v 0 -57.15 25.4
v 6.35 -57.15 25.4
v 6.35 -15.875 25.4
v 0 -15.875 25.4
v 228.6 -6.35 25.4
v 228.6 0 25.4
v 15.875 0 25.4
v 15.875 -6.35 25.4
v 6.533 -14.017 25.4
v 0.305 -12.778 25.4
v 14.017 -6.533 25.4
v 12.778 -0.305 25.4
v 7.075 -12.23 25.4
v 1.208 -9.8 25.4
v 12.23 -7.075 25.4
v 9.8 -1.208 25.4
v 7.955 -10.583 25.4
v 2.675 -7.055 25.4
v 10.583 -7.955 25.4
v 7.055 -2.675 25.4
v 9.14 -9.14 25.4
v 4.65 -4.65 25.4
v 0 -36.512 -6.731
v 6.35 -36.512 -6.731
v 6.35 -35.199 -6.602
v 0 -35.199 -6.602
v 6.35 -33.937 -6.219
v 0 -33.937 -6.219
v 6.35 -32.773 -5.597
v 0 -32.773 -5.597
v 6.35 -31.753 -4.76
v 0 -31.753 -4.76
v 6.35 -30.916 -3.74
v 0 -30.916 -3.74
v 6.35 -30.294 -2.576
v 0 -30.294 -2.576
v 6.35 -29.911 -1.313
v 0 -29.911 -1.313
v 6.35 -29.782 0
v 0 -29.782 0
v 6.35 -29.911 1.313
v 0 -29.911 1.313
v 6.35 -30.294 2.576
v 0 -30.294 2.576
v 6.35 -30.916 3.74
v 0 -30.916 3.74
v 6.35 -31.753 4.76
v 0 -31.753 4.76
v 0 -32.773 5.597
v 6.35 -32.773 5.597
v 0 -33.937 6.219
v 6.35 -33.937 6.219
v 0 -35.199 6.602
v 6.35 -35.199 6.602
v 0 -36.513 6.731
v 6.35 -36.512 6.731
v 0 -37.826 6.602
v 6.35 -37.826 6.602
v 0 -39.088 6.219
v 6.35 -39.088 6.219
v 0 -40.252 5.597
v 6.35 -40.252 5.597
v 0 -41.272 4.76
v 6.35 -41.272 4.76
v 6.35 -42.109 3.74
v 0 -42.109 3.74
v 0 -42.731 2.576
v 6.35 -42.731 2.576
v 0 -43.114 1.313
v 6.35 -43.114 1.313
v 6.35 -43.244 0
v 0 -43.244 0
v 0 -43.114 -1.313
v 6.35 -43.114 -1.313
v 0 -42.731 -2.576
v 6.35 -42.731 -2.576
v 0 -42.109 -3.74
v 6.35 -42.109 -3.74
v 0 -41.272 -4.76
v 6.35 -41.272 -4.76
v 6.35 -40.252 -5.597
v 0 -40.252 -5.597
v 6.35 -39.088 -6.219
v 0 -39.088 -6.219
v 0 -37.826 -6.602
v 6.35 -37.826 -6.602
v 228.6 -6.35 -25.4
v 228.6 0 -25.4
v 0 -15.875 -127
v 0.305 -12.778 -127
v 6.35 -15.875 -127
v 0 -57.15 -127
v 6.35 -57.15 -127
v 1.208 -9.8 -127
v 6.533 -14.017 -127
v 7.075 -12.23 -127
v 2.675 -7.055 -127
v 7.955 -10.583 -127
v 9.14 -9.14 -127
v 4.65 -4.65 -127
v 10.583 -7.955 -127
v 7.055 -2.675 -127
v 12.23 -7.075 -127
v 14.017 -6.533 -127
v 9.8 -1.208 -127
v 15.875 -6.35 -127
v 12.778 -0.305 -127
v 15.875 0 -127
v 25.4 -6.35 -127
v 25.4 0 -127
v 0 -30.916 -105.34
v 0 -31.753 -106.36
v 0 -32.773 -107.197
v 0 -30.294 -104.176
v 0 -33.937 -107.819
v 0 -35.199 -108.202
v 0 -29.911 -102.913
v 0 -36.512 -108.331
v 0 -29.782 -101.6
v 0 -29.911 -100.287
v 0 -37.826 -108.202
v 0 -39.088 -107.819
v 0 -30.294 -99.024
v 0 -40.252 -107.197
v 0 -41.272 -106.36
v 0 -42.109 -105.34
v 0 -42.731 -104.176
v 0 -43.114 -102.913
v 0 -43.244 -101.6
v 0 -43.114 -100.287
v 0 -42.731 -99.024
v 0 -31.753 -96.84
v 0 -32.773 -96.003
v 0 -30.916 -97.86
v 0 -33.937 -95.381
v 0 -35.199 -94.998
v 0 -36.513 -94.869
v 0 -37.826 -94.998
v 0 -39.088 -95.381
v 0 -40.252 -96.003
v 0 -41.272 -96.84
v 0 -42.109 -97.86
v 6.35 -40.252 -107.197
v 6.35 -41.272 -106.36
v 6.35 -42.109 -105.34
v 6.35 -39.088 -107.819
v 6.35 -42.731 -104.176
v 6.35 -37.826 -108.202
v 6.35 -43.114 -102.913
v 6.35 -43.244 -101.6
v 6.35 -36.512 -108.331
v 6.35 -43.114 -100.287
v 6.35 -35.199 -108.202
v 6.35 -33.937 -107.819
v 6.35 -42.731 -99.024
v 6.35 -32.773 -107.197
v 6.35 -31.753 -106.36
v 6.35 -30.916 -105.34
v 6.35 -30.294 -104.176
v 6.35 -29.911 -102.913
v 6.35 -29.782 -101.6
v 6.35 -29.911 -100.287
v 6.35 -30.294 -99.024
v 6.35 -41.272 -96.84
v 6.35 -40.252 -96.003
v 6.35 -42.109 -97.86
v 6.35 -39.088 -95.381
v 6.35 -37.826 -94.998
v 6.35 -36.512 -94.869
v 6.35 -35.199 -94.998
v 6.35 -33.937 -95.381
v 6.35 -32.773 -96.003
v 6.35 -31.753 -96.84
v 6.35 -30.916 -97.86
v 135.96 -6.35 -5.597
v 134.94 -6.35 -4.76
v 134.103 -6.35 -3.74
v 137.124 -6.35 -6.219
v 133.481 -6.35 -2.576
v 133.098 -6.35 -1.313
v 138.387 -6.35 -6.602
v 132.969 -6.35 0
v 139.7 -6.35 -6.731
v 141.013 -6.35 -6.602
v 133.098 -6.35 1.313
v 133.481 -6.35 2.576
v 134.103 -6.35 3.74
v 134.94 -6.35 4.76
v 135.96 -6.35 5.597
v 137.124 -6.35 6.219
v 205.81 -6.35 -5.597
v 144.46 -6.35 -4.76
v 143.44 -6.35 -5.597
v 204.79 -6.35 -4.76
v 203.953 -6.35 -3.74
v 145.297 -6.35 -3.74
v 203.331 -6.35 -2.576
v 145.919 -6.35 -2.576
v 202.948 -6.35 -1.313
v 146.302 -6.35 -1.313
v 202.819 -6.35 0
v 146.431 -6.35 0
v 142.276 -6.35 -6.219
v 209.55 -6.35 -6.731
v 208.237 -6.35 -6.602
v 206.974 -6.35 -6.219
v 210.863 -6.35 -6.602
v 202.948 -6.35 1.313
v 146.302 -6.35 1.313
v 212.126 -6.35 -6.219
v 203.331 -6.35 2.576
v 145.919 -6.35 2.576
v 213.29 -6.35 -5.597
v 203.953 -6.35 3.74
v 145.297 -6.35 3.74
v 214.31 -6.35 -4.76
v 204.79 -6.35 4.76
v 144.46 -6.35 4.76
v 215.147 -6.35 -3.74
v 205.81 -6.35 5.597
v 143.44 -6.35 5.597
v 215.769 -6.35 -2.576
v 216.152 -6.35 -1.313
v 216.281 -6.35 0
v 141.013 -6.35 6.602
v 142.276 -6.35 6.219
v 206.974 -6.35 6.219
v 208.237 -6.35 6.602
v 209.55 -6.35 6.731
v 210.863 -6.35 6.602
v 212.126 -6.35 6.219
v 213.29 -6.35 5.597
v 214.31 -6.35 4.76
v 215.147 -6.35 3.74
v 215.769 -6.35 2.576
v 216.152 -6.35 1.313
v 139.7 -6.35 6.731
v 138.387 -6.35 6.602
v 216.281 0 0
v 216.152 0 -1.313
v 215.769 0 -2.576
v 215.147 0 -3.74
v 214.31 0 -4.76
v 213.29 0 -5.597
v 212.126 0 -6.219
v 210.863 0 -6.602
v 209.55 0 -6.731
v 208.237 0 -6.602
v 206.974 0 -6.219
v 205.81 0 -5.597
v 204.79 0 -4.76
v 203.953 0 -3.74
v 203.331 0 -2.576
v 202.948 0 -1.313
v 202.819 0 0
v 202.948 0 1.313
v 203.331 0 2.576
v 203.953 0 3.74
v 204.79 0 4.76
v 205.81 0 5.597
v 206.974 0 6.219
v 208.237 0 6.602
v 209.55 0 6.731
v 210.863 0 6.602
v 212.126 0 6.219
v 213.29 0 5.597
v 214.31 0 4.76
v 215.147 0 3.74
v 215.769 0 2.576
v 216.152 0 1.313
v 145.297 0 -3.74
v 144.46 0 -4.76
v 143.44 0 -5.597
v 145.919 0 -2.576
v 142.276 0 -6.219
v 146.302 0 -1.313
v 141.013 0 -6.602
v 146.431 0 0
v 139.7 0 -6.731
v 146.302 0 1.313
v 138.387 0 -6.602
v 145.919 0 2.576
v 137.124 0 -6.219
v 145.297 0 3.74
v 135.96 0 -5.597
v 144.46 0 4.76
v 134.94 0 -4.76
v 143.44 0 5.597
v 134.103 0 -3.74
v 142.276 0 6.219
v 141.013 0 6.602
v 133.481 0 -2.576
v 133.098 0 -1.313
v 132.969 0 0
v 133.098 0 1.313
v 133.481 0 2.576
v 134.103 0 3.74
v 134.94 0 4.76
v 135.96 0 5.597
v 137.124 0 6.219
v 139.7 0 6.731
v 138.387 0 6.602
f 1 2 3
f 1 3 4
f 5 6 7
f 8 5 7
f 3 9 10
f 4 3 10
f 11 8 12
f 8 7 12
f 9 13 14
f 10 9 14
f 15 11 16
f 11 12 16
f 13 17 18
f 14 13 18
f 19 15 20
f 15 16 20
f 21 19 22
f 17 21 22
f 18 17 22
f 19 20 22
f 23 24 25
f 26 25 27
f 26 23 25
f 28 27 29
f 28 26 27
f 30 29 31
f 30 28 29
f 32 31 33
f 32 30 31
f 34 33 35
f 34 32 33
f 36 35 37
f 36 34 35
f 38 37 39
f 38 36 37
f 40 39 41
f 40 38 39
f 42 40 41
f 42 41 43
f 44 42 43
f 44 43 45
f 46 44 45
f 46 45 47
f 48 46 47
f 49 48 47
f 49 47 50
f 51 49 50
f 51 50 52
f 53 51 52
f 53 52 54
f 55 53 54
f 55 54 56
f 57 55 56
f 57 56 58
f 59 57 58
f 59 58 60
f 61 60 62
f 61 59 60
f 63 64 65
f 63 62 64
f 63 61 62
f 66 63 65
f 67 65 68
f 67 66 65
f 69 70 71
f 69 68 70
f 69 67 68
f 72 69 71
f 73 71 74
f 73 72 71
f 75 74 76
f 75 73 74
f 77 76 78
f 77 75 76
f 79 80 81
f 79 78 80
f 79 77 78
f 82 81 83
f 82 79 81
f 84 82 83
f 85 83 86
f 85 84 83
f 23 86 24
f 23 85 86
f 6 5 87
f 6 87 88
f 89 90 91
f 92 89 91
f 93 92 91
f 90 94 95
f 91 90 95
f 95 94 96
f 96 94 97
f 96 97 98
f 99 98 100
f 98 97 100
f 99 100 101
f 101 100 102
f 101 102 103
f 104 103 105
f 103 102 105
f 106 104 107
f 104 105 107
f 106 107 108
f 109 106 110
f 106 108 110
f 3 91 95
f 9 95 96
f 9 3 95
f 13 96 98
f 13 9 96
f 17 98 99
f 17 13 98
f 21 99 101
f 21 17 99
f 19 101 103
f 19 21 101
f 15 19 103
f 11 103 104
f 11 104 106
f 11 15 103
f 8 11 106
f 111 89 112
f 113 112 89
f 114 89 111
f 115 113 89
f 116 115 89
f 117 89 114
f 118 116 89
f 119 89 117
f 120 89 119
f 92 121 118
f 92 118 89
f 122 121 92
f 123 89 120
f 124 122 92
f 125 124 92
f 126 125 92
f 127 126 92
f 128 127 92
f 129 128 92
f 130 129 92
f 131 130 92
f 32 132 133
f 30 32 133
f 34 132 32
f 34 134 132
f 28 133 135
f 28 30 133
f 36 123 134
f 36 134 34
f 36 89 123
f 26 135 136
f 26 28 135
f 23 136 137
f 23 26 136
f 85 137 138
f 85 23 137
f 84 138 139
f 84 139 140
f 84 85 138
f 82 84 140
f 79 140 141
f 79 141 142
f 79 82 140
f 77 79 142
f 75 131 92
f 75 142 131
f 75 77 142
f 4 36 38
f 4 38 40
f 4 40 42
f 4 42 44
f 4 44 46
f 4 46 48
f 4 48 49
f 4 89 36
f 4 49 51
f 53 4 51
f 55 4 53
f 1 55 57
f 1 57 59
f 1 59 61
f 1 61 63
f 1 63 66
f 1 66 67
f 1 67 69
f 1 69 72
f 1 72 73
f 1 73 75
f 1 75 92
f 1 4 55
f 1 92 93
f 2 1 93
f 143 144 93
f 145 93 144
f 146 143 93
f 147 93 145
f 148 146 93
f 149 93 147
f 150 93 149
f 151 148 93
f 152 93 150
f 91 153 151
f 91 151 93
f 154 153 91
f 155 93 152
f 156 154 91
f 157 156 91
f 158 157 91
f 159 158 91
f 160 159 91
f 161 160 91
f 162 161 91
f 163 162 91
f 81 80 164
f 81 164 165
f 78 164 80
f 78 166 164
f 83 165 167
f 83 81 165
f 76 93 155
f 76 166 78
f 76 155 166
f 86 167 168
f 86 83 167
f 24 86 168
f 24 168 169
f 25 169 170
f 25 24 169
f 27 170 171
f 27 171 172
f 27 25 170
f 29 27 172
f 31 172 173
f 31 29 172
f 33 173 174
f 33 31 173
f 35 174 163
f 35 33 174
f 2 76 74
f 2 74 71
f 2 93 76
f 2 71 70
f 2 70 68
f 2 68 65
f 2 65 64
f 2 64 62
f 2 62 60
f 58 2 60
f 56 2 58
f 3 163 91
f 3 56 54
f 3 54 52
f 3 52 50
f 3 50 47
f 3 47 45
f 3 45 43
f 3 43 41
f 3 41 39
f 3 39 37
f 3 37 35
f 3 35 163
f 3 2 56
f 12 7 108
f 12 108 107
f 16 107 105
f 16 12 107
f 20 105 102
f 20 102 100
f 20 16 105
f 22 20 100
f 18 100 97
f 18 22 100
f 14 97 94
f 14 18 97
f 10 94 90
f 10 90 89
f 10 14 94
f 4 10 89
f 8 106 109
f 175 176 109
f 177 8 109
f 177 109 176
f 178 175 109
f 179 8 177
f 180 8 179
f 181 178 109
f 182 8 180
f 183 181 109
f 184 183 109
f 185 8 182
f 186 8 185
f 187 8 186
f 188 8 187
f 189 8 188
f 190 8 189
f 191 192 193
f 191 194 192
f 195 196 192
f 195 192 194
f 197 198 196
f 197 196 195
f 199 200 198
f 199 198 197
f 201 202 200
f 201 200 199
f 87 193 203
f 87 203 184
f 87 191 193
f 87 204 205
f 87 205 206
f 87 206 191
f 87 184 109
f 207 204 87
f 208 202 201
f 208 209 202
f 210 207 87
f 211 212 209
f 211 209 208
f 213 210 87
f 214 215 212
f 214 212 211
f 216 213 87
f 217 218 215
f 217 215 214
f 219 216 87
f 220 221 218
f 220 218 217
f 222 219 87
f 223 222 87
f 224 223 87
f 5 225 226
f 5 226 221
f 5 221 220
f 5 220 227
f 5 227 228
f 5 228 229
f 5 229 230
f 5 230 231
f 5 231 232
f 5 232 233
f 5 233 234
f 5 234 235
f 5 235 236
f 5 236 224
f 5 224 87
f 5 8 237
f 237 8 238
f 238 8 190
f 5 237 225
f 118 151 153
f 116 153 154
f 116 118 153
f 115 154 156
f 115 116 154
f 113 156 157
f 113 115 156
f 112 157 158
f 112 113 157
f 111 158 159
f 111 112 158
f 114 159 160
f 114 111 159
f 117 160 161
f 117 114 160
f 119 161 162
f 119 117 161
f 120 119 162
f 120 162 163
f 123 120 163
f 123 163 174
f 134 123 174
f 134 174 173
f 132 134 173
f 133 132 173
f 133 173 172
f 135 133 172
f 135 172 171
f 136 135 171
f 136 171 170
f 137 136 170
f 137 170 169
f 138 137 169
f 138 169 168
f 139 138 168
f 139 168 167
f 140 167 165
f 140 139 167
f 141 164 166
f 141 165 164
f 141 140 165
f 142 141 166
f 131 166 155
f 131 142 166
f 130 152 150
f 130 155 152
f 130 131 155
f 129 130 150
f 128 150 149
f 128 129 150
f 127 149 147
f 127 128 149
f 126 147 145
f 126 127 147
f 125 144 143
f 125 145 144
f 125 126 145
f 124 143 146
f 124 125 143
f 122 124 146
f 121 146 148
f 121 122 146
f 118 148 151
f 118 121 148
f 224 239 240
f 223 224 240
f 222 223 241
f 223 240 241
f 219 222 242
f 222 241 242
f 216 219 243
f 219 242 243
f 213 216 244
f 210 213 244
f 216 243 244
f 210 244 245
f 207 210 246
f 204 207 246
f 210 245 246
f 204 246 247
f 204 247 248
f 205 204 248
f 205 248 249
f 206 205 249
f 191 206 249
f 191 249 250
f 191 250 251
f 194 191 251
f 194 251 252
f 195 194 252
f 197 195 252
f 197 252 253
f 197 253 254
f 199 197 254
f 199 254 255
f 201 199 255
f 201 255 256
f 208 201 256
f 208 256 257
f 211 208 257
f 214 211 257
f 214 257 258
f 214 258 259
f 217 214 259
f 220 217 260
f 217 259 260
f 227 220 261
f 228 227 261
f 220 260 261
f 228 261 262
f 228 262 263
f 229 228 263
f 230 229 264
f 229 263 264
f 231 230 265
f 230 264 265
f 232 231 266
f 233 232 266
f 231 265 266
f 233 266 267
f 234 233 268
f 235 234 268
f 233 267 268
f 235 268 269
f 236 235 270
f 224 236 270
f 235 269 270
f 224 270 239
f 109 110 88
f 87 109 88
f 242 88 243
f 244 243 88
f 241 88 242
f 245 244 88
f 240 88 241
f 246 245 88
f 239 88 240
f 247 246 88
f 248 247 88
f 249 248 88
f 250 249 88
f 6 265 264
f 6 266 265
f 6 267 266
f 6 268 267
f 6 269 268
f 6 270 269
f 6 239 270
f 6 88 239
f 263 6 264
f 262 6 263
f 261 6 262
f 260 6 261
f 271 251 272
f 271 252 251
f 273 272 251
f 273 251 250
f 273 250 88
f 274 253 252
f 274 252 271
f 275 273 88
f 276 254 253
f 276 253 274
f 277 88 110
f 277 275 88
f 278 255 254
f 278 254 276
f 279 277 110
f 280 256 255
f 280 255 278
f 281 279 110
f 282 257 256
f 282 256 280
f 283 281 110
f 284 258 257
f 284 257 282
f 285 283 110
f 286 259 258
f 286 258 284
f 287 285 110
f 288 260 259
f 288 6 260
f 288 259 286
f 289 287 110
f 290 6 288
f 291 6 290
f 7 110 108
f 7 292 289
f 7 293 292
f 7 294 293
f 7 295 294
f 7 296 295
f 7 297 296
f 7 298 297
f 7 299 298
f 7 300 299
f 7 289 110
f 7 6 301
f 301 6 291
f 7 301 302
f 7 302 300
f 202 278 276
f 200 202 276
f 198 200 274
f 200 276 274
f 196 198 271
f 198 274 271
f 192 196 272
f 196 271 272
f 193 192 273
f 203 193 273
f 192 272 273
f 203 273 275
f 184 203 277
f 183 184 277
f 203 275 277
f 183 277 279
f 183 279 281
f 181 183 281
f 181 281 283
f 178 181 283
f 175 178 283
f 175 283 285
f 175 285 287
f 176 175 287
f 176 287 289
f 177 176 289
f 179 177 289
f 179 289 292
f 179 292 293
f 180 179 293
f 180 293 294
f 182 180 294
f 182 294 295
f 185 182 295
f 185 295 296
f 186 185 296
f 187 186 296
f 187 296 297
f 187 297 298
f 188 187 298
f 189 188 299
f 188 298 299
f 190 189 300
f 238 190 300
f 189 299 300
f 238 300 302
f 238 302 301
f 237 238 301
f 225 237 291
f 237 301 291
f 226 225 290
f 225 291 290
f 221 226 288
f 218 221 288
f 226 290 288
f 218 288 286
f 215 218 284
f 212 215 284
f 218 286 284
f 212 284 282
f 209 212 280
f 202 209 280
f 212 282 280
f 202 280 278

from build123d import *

# Parameters (mm, degrees)
EXTRUDE1_DEPTH         = 127
SKETCH2_R              = 6.731
CUT_CHAMFER_DEPTH      = 508
CUT_CHAMFER_DEPTH_BACK = 58.15
SKETCH3_R              = 6.731
CUT_HOLES_DEPTH        = 229.6
CUT_LH_001_DEPTH       = 58.15


with BuildPart() as part:
    # Sketch1 → Extrude1 (new body, symmetric)
    with BuildSketch(Plane.XY):
        with BuildLine():
            Line((228.6, 0), (15.875, 0))
            ThreePointArc((15.875, 0), (4.649679849, -4.649679849), (0, -15.875))
            Line((0, -15.875), (0, -57.15))
            Line((0, -57.15), (6.35, -57.15))
            Line((6.35, -57.15), (6.35, -15.875))
            ThreePointArc((6.35, -15.875), (9.139807909, -9.139807909), (15.875, -6.35))
            Line((15.875, -6.35), (228.6, -6.35))
            Line((228.6, -6.35), (228.6, 0))
        make_face()
    extrude(amount=EXTRUDE1_DEPTH, both=True)

    # Sketch2 → Cut-Chamfer (cut, two sides)
    with BuildSketch(Plane(origin=(0, 0, 0), x_dir=(1, 0, 0), z_dir=(0, 1, 0))) as cut_chamfer_sk:
        with Locations((209.55, 0)):
            Circle(SKETCH2_R)
        with Locations((139.7, 0)):
            Circle(SKETCH2_R)
        Polygon((25.4, 127), (228.6, 25.4), (228.6, 127), align=None)
        Polygon((25.4, -127), (228.6, -25.4), (228.6, -127), align=None)
    extrude(amount=CUT_CHAMFER_DEPTH, mode=Mode.SUBTRACT)
    extrude(cut_chamfer_sk.sketch, amount=-CUT_CHAMFER_DEPTH_BACK, mode=Mode.SUBTRACT)

    # Sketch3 → Cut-Holes (cut, through all)
    with BuildSketch(Plane(origin=(0, 0, 0), x_dir=(0, 0, -1), z_dir=(1, 0, 0))):
        with Locations((0, -36.5125)):
            Circle(SKETCH3_R)
        with Locations((101.6, -36.5125)):
            Circle(SKETCH3_R)
        with Locations((0, -150.8125)):
            Circle(SKETCH3_R)
        with Locations((101.6, -150.8125)):
            Circle(SKETCH3_R)
        with Locations((-101.6, -36.5125)):
            Circle(SKETCH3_R)
        with Locations((-101.6, -150.8125)):
            Circle(SKETCH3_R)
    extrude(amount=CUT_HOLES_DEPTH, mode=Mode.SUBTRACT)

    # Sketch5 → Cut LH -001 (cut, through all)
    with BuildSketch(Plane(origin=(0, 0, 0), x_dir=(1, 0, 0), z_dir=(0, 1, 0))):
        Polygon((-579.123087515, -25.4), (-7.348788452, -25.4), (228.6, -25.4), (800.374299063, -25.4), (800.374299063, -1168.948598126), (-579.123087515, -1168.948598126), align=None)
    extrude(amount=-CUT_LH_001_DEPTH, mode=Mode.SUBTRACT)


solid = part.part
